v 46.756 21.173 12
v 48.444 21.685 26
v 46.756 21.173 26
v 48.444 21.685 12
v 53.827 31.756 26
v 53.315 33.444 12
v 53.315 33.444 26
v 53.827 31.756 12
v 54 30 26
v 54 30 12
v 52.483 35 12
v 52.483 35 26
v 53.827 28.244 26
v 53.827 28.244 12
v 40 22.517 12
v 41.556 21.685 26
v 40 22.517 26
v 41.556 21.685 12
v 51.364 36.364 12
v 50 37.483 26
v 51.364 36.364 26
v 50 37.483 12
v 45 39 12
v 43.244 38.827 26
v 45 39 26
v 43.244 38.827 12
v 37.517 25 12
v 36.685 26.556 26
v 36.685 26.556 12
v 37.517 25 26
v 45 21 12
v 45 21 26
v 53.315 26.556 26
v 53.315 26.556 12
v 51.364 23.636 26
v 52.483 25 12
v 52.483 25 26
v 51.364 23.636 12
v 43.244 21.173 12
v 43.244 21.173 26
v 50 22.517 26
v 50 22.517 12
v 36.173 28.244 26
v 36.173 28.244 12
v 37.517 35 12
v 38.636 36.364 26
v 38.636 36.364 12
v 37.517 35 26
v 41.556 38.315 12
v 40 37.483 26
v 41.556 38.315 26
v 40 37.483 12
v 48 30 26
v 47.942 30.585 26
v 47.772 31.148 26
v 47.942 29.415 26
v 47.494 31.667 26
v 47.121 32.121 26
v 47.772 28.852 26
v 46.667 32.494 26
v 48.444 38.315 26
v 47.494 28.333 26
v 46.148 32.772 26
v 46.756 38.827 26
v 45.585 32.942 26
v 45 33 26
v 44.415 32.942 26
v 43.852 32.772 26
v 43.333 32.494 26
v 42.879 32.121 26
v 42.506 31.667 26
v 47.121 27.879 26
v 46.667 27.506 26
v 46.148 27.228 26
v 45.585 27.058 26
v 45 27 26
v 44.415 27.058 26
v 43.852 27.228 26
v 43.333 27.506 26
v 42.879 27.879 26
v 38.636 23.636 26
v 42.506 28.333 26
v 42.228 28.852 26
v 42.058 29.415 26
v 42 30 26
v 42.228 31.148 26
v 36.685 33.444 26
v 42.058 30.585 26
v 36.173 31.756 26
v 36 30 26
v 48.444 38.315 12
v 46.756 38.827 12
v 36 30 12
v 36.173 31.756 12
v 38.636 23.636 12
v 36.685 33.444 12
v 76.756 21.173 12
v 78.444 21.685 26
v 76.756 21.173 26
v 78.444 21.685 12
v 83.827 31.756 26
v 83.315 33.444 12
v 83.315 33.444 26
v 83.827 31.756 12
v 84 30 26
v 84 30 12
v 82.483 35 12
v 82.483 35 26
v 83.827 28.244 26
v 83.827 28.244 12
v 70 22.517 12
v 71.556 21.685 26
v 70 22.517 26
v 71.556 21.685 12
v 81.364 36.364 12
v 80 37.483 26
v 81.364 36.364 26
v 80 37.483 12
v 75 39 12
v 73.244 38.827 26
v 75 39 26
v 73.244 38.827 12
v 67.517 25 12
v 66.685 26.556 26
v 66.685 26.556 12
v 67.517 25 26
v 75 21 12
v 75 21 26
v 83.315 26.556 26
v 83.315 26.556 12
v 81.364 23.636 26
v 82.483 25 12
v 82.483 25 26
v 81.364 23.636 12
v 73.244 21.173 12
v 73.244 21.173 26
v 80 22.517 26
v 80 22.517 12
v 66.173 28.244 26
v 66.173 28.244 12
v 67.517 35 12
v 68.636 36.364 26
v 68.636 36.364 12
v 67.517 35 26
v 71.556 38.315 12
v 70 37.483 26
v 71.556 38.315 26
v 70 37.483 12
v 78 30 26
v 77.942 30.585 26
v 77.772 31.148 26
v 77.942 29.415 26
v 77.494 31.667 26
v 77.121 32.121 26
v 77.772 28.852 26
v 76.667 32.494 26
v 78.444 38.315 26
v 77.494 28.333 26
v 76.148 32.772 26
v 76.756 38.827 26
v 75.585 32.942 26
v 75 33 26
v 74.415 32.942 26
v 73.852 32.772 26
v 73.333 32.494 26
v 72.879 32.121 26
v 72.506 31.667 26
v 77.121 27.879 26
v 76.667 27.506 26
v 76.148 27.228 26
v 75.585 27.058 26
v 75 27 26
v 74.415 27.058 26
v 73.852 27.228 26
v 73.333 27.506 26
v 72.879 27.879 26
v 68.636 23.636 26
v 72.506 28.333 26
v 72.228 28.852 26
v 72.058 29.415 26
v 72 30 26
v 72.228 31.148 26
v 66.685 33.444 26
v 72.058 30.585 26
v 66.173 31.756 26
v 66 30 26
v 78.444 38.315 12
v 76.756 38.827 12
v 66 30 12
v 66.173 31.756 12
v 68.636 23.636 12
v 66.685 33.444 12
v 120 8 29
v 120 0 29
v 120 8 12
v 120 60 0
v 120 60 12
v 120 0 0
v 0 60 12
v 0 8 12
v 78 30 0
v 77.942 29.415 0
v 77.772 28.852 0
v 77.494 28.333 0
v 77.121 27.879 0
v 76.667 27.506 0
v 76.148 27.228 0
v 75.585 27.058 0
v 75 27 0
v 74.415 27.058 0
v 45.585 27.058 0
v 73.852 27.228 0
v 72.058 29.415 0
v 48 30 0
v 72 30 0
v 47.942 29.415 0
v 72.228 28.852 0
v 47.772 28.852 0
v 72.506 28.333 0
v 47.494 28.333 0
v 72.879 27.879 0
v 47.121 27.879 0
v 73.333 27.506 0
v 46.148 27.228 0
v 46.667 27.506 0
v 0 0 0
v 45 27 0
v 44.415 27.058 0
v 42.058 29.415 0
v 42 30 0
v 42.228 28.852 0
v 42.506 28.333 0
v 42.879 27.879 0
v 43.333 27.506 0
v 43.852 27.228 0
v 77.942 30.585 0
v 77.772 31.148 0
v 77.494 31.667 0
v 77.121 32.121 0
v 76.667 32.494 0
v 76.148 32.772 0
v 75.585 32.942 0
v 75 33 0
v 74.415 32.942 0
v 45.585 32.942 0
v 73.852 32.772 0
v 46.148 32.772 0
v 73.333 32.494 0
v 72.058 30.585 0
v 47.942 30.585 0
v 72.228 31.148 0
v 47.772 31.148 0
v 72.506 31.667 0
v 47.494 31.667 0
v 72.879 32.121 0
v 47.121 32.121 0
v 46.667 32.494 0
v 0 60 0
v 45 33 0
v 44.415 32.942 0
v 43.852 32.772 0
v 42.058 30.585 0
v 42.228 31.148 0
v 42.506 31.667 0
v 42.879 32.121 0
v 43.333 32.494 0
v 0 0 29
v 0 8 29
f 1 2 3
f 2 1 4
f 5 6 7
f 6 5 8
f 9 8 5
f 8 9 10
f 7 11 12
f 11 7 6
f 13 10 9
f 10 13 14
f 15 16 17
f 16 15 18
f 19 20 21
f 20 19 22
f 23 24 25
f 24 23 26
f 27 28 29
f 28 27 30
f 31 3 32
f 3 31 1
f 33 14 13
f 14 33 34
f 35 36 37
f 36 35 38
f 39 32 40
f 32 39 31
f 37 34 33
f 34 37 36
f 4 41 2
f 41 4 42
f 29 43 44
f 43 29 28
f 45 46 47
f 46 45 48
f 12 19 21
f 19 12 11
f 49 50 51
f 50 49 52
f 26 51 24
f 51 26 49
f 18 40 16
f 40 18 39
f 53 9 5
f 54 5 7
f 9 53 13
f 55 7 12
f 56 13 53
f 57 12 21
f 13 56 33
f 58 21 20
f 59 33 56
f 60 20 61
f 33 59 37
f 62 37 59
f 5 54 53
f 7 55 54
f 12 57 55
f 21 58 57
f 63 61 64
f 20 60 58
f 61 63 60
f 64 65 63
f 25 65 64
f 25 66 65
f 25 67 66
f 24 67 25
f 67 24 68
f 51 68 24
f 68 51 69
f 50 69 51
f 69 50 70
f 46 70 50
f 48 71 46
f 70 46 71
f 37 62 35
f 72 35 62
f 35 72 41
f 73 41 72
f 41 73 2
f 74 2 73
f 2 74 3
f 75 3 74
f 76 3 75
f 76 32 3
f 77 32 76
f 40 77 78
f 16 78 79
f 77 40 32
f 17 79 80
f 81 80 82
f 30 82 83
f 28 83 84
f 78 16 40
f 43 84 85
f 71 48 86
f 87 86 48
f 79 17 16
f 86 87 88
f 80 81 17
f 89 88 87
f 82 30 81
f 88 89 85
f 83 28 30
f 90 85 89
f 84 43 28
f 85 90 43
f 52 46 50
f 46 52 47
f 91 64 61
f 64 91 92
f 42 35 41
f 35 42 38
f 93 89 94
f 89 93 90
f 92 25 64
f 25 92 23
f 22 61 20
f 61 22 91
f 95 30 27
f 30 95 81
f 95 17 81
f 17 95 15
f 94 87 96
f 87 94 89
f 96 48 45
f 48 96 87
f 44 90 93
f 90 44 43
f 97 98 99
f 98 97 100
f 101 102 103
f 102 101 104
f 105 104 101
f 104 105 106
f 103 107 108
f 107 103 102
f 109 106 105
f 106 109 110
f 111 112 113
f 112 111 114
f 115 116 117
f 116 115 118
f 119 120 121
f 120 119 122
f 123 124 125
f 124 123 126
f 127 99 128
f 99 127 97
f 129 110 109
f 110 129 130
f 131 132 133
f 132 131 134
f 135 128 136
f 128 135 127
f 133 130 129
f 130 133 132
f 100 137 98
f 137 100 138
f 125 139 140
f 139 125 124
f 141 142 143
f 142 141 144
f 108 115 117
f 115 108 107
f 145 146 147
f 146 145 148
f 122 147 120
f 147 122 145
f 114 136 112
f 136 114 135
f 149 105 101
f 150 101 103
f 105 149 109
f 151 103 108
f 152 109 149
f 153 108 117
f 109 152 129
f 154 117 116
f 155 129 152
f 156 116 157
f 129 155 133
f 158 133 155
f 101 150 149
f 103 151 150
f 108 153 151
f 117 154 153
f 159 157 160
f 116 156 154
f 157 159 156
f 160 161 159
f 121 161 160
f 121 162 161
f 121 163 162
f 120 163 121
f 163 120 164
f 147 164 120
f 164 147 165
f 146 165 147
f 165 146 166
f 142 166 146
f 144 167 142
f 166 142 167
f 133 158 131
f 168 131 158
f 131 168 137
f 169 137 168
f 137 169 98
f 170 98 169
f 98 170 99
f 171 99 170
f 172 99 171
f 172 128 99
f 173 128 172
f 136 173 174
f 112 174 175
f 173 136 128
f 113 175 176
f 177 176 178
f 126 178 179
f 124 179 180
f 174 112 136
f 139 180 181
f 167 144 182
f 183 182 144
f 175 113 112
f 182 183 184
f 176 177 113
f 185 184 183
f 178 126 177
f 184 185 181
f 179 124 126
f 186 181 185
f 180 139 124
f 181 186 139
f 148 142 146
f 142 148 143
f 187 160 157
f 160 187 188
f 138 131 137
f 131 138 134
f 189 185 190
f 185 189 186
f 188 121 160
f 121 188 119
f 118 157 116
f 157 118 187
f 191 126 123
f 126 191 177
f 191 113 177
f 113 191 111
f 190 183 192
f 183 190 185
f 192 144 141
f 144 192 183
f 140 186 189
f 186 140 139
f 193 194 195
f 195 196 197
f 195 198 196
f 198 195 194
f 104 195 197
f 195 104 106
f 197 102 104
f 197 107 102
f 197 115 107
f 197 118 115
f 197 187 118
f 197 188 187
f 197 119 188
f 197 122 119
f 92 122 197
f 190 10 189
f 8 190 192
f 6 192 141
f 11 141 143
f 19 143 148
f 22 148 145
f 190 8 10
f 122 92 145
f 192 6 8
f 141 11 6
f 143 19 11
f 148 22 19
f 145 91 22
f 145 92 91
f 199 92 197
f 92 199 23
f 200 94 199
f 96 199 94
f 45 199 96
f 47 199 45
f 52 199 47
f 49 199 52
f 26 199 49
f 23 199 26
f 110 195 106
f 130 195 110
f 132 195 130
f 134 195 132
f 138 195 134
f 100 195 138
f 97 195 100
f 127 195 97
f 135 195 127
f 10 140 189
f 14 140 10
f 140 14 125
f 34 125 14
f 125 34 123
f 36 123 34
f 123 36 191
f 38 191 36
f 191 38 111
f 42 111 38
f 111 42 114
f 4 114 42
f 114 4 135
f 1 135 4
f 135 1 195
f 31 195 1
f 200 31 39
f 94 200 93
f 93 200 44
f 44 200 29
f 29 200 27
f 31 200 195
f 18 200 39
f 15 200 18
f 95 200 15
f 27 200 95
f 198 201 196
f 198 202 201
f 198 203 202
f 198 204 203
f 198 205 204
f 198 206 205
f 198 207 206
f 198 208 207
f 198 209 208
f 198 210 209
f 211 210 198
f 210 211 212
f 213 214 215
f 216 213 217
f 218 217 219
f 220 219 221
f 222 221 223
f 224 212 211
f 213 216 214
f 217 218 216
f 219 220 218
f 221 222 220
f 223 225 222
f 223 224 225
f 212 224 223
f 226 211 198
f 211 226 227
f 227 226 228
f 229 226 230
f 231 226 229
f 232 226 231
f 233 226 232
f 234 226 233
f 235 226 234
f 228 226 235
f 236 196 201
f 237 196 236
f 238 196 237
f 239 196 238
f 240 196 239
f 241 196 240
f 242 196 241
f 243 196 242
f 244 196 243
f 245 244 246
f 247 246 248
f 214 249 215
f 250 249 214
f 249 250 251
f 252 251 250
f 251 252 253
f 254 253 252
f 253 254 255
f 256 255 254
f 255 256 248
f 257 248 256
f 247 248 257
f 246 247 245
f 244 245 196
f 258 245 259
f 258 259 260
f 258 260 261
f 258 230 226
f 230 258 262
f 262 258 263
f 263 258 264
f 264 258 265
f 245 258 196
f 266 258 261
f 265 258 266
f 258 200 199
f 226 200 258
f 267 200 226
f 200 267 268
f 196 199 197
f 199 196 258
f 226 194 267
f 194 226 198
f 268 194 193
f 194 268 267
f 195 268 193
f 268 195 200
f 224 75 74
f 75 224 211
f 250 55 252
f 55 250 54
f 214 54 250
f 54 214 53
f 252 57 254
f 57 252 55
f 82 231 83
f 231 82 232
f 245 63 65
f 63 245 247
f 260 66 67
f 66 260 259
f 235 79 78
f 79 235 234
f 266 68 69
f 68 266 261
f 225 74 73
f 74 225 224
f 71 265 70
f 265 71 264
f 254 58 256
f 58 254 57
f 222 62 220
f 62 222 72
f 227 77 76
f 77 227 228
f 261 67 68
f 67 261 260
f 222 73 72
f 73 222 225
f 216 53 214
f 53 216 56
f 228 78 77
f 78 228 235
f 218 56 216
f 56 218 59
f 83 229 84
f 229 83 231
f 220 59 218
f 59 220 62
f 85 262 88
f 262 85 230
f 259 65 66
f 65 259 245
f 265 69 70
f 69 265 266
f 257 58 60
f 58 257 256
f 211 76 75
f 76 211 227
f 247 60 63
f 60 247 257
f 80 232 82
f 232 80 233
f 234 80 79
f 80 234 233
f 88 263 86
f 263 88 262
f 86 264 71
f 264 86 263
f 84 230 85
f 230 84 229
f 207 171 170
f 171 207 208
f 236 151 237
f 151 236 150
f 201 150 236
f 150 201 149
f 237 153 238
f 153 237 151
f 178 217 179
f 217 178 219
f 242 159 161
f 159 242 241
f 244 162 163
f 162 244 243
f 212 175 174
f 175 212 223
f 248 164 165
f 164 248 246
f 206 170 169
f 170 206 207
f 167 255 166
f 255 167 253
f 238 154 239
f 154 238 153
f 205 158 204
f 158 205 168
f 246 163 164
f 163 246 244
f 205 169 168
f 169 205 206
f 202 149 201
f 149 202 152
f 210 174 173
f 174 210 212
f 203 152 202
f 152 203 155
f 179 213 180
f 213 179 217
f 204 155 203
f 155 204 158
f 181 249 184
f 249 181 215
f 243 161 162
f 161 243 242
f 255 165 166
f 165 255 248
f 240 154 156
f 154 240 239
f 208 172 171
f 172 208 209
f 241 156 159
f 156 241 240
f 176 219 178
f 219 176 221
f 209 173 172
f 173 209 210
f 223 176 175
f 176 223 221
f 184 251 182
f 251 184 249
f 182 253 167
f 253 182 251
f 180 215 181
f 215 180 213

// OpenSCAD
$fn = 32;

// ----------------------------------------------------------------------
// Drill jig: fence jig
// ----------------------------------------------------------------------

// --- parameters (mm) ---
plate_l = 120;            // plate length, X
plate_w = 60;             // plate width, Y
plate_t = 12;             // plate thickness
boss_d = 18;              // guide boss diameter
boss_h = 15;              // boss height above the plate
guide_d = 6;              // guide hole diameter
boss_pitch = 30;          // boss pitch
fence_h = 18;             // fence height above the plate
fence_t = 8;              // fence thickness
fit_tol = 0.1;            // tolerance for press fits, mm
free_tol = 0.3;           // tolerance for clearance fits, mm

n_boss = 2;  // guide bosses
boss_x0 = (plate_l - (n_boss - 1) * boss_pitch) / 2;  // first boss X
boss_top = plate_t - 1 + boss_h;  // boss crown height
fence_top = plate_t - 1 + fence_h;  // fence crown height
total_h = max([fence_top, boss_top]);  // overall height

difference() {
  union() {
  cube([plate_l, plate_w, plate_t]);
  for (i = [0 : n_boss - 1])
    translate([boss_x0 + i * boss_pitch, plate_w / 2, plate_t - 1])
      cylinder(h = boss_h, d = boss_d);
  translate([0, 0, plate_t - 1]) cube([plate_l, fence_t, fence_h]);
  }
  for (i = [0 : n_boss - 1])
    translate([boss_x0 + i * boss_pitch, plate_w / 2, -1])
      cylinder(h = plate_t + boss_h, d = guide_d);
}
